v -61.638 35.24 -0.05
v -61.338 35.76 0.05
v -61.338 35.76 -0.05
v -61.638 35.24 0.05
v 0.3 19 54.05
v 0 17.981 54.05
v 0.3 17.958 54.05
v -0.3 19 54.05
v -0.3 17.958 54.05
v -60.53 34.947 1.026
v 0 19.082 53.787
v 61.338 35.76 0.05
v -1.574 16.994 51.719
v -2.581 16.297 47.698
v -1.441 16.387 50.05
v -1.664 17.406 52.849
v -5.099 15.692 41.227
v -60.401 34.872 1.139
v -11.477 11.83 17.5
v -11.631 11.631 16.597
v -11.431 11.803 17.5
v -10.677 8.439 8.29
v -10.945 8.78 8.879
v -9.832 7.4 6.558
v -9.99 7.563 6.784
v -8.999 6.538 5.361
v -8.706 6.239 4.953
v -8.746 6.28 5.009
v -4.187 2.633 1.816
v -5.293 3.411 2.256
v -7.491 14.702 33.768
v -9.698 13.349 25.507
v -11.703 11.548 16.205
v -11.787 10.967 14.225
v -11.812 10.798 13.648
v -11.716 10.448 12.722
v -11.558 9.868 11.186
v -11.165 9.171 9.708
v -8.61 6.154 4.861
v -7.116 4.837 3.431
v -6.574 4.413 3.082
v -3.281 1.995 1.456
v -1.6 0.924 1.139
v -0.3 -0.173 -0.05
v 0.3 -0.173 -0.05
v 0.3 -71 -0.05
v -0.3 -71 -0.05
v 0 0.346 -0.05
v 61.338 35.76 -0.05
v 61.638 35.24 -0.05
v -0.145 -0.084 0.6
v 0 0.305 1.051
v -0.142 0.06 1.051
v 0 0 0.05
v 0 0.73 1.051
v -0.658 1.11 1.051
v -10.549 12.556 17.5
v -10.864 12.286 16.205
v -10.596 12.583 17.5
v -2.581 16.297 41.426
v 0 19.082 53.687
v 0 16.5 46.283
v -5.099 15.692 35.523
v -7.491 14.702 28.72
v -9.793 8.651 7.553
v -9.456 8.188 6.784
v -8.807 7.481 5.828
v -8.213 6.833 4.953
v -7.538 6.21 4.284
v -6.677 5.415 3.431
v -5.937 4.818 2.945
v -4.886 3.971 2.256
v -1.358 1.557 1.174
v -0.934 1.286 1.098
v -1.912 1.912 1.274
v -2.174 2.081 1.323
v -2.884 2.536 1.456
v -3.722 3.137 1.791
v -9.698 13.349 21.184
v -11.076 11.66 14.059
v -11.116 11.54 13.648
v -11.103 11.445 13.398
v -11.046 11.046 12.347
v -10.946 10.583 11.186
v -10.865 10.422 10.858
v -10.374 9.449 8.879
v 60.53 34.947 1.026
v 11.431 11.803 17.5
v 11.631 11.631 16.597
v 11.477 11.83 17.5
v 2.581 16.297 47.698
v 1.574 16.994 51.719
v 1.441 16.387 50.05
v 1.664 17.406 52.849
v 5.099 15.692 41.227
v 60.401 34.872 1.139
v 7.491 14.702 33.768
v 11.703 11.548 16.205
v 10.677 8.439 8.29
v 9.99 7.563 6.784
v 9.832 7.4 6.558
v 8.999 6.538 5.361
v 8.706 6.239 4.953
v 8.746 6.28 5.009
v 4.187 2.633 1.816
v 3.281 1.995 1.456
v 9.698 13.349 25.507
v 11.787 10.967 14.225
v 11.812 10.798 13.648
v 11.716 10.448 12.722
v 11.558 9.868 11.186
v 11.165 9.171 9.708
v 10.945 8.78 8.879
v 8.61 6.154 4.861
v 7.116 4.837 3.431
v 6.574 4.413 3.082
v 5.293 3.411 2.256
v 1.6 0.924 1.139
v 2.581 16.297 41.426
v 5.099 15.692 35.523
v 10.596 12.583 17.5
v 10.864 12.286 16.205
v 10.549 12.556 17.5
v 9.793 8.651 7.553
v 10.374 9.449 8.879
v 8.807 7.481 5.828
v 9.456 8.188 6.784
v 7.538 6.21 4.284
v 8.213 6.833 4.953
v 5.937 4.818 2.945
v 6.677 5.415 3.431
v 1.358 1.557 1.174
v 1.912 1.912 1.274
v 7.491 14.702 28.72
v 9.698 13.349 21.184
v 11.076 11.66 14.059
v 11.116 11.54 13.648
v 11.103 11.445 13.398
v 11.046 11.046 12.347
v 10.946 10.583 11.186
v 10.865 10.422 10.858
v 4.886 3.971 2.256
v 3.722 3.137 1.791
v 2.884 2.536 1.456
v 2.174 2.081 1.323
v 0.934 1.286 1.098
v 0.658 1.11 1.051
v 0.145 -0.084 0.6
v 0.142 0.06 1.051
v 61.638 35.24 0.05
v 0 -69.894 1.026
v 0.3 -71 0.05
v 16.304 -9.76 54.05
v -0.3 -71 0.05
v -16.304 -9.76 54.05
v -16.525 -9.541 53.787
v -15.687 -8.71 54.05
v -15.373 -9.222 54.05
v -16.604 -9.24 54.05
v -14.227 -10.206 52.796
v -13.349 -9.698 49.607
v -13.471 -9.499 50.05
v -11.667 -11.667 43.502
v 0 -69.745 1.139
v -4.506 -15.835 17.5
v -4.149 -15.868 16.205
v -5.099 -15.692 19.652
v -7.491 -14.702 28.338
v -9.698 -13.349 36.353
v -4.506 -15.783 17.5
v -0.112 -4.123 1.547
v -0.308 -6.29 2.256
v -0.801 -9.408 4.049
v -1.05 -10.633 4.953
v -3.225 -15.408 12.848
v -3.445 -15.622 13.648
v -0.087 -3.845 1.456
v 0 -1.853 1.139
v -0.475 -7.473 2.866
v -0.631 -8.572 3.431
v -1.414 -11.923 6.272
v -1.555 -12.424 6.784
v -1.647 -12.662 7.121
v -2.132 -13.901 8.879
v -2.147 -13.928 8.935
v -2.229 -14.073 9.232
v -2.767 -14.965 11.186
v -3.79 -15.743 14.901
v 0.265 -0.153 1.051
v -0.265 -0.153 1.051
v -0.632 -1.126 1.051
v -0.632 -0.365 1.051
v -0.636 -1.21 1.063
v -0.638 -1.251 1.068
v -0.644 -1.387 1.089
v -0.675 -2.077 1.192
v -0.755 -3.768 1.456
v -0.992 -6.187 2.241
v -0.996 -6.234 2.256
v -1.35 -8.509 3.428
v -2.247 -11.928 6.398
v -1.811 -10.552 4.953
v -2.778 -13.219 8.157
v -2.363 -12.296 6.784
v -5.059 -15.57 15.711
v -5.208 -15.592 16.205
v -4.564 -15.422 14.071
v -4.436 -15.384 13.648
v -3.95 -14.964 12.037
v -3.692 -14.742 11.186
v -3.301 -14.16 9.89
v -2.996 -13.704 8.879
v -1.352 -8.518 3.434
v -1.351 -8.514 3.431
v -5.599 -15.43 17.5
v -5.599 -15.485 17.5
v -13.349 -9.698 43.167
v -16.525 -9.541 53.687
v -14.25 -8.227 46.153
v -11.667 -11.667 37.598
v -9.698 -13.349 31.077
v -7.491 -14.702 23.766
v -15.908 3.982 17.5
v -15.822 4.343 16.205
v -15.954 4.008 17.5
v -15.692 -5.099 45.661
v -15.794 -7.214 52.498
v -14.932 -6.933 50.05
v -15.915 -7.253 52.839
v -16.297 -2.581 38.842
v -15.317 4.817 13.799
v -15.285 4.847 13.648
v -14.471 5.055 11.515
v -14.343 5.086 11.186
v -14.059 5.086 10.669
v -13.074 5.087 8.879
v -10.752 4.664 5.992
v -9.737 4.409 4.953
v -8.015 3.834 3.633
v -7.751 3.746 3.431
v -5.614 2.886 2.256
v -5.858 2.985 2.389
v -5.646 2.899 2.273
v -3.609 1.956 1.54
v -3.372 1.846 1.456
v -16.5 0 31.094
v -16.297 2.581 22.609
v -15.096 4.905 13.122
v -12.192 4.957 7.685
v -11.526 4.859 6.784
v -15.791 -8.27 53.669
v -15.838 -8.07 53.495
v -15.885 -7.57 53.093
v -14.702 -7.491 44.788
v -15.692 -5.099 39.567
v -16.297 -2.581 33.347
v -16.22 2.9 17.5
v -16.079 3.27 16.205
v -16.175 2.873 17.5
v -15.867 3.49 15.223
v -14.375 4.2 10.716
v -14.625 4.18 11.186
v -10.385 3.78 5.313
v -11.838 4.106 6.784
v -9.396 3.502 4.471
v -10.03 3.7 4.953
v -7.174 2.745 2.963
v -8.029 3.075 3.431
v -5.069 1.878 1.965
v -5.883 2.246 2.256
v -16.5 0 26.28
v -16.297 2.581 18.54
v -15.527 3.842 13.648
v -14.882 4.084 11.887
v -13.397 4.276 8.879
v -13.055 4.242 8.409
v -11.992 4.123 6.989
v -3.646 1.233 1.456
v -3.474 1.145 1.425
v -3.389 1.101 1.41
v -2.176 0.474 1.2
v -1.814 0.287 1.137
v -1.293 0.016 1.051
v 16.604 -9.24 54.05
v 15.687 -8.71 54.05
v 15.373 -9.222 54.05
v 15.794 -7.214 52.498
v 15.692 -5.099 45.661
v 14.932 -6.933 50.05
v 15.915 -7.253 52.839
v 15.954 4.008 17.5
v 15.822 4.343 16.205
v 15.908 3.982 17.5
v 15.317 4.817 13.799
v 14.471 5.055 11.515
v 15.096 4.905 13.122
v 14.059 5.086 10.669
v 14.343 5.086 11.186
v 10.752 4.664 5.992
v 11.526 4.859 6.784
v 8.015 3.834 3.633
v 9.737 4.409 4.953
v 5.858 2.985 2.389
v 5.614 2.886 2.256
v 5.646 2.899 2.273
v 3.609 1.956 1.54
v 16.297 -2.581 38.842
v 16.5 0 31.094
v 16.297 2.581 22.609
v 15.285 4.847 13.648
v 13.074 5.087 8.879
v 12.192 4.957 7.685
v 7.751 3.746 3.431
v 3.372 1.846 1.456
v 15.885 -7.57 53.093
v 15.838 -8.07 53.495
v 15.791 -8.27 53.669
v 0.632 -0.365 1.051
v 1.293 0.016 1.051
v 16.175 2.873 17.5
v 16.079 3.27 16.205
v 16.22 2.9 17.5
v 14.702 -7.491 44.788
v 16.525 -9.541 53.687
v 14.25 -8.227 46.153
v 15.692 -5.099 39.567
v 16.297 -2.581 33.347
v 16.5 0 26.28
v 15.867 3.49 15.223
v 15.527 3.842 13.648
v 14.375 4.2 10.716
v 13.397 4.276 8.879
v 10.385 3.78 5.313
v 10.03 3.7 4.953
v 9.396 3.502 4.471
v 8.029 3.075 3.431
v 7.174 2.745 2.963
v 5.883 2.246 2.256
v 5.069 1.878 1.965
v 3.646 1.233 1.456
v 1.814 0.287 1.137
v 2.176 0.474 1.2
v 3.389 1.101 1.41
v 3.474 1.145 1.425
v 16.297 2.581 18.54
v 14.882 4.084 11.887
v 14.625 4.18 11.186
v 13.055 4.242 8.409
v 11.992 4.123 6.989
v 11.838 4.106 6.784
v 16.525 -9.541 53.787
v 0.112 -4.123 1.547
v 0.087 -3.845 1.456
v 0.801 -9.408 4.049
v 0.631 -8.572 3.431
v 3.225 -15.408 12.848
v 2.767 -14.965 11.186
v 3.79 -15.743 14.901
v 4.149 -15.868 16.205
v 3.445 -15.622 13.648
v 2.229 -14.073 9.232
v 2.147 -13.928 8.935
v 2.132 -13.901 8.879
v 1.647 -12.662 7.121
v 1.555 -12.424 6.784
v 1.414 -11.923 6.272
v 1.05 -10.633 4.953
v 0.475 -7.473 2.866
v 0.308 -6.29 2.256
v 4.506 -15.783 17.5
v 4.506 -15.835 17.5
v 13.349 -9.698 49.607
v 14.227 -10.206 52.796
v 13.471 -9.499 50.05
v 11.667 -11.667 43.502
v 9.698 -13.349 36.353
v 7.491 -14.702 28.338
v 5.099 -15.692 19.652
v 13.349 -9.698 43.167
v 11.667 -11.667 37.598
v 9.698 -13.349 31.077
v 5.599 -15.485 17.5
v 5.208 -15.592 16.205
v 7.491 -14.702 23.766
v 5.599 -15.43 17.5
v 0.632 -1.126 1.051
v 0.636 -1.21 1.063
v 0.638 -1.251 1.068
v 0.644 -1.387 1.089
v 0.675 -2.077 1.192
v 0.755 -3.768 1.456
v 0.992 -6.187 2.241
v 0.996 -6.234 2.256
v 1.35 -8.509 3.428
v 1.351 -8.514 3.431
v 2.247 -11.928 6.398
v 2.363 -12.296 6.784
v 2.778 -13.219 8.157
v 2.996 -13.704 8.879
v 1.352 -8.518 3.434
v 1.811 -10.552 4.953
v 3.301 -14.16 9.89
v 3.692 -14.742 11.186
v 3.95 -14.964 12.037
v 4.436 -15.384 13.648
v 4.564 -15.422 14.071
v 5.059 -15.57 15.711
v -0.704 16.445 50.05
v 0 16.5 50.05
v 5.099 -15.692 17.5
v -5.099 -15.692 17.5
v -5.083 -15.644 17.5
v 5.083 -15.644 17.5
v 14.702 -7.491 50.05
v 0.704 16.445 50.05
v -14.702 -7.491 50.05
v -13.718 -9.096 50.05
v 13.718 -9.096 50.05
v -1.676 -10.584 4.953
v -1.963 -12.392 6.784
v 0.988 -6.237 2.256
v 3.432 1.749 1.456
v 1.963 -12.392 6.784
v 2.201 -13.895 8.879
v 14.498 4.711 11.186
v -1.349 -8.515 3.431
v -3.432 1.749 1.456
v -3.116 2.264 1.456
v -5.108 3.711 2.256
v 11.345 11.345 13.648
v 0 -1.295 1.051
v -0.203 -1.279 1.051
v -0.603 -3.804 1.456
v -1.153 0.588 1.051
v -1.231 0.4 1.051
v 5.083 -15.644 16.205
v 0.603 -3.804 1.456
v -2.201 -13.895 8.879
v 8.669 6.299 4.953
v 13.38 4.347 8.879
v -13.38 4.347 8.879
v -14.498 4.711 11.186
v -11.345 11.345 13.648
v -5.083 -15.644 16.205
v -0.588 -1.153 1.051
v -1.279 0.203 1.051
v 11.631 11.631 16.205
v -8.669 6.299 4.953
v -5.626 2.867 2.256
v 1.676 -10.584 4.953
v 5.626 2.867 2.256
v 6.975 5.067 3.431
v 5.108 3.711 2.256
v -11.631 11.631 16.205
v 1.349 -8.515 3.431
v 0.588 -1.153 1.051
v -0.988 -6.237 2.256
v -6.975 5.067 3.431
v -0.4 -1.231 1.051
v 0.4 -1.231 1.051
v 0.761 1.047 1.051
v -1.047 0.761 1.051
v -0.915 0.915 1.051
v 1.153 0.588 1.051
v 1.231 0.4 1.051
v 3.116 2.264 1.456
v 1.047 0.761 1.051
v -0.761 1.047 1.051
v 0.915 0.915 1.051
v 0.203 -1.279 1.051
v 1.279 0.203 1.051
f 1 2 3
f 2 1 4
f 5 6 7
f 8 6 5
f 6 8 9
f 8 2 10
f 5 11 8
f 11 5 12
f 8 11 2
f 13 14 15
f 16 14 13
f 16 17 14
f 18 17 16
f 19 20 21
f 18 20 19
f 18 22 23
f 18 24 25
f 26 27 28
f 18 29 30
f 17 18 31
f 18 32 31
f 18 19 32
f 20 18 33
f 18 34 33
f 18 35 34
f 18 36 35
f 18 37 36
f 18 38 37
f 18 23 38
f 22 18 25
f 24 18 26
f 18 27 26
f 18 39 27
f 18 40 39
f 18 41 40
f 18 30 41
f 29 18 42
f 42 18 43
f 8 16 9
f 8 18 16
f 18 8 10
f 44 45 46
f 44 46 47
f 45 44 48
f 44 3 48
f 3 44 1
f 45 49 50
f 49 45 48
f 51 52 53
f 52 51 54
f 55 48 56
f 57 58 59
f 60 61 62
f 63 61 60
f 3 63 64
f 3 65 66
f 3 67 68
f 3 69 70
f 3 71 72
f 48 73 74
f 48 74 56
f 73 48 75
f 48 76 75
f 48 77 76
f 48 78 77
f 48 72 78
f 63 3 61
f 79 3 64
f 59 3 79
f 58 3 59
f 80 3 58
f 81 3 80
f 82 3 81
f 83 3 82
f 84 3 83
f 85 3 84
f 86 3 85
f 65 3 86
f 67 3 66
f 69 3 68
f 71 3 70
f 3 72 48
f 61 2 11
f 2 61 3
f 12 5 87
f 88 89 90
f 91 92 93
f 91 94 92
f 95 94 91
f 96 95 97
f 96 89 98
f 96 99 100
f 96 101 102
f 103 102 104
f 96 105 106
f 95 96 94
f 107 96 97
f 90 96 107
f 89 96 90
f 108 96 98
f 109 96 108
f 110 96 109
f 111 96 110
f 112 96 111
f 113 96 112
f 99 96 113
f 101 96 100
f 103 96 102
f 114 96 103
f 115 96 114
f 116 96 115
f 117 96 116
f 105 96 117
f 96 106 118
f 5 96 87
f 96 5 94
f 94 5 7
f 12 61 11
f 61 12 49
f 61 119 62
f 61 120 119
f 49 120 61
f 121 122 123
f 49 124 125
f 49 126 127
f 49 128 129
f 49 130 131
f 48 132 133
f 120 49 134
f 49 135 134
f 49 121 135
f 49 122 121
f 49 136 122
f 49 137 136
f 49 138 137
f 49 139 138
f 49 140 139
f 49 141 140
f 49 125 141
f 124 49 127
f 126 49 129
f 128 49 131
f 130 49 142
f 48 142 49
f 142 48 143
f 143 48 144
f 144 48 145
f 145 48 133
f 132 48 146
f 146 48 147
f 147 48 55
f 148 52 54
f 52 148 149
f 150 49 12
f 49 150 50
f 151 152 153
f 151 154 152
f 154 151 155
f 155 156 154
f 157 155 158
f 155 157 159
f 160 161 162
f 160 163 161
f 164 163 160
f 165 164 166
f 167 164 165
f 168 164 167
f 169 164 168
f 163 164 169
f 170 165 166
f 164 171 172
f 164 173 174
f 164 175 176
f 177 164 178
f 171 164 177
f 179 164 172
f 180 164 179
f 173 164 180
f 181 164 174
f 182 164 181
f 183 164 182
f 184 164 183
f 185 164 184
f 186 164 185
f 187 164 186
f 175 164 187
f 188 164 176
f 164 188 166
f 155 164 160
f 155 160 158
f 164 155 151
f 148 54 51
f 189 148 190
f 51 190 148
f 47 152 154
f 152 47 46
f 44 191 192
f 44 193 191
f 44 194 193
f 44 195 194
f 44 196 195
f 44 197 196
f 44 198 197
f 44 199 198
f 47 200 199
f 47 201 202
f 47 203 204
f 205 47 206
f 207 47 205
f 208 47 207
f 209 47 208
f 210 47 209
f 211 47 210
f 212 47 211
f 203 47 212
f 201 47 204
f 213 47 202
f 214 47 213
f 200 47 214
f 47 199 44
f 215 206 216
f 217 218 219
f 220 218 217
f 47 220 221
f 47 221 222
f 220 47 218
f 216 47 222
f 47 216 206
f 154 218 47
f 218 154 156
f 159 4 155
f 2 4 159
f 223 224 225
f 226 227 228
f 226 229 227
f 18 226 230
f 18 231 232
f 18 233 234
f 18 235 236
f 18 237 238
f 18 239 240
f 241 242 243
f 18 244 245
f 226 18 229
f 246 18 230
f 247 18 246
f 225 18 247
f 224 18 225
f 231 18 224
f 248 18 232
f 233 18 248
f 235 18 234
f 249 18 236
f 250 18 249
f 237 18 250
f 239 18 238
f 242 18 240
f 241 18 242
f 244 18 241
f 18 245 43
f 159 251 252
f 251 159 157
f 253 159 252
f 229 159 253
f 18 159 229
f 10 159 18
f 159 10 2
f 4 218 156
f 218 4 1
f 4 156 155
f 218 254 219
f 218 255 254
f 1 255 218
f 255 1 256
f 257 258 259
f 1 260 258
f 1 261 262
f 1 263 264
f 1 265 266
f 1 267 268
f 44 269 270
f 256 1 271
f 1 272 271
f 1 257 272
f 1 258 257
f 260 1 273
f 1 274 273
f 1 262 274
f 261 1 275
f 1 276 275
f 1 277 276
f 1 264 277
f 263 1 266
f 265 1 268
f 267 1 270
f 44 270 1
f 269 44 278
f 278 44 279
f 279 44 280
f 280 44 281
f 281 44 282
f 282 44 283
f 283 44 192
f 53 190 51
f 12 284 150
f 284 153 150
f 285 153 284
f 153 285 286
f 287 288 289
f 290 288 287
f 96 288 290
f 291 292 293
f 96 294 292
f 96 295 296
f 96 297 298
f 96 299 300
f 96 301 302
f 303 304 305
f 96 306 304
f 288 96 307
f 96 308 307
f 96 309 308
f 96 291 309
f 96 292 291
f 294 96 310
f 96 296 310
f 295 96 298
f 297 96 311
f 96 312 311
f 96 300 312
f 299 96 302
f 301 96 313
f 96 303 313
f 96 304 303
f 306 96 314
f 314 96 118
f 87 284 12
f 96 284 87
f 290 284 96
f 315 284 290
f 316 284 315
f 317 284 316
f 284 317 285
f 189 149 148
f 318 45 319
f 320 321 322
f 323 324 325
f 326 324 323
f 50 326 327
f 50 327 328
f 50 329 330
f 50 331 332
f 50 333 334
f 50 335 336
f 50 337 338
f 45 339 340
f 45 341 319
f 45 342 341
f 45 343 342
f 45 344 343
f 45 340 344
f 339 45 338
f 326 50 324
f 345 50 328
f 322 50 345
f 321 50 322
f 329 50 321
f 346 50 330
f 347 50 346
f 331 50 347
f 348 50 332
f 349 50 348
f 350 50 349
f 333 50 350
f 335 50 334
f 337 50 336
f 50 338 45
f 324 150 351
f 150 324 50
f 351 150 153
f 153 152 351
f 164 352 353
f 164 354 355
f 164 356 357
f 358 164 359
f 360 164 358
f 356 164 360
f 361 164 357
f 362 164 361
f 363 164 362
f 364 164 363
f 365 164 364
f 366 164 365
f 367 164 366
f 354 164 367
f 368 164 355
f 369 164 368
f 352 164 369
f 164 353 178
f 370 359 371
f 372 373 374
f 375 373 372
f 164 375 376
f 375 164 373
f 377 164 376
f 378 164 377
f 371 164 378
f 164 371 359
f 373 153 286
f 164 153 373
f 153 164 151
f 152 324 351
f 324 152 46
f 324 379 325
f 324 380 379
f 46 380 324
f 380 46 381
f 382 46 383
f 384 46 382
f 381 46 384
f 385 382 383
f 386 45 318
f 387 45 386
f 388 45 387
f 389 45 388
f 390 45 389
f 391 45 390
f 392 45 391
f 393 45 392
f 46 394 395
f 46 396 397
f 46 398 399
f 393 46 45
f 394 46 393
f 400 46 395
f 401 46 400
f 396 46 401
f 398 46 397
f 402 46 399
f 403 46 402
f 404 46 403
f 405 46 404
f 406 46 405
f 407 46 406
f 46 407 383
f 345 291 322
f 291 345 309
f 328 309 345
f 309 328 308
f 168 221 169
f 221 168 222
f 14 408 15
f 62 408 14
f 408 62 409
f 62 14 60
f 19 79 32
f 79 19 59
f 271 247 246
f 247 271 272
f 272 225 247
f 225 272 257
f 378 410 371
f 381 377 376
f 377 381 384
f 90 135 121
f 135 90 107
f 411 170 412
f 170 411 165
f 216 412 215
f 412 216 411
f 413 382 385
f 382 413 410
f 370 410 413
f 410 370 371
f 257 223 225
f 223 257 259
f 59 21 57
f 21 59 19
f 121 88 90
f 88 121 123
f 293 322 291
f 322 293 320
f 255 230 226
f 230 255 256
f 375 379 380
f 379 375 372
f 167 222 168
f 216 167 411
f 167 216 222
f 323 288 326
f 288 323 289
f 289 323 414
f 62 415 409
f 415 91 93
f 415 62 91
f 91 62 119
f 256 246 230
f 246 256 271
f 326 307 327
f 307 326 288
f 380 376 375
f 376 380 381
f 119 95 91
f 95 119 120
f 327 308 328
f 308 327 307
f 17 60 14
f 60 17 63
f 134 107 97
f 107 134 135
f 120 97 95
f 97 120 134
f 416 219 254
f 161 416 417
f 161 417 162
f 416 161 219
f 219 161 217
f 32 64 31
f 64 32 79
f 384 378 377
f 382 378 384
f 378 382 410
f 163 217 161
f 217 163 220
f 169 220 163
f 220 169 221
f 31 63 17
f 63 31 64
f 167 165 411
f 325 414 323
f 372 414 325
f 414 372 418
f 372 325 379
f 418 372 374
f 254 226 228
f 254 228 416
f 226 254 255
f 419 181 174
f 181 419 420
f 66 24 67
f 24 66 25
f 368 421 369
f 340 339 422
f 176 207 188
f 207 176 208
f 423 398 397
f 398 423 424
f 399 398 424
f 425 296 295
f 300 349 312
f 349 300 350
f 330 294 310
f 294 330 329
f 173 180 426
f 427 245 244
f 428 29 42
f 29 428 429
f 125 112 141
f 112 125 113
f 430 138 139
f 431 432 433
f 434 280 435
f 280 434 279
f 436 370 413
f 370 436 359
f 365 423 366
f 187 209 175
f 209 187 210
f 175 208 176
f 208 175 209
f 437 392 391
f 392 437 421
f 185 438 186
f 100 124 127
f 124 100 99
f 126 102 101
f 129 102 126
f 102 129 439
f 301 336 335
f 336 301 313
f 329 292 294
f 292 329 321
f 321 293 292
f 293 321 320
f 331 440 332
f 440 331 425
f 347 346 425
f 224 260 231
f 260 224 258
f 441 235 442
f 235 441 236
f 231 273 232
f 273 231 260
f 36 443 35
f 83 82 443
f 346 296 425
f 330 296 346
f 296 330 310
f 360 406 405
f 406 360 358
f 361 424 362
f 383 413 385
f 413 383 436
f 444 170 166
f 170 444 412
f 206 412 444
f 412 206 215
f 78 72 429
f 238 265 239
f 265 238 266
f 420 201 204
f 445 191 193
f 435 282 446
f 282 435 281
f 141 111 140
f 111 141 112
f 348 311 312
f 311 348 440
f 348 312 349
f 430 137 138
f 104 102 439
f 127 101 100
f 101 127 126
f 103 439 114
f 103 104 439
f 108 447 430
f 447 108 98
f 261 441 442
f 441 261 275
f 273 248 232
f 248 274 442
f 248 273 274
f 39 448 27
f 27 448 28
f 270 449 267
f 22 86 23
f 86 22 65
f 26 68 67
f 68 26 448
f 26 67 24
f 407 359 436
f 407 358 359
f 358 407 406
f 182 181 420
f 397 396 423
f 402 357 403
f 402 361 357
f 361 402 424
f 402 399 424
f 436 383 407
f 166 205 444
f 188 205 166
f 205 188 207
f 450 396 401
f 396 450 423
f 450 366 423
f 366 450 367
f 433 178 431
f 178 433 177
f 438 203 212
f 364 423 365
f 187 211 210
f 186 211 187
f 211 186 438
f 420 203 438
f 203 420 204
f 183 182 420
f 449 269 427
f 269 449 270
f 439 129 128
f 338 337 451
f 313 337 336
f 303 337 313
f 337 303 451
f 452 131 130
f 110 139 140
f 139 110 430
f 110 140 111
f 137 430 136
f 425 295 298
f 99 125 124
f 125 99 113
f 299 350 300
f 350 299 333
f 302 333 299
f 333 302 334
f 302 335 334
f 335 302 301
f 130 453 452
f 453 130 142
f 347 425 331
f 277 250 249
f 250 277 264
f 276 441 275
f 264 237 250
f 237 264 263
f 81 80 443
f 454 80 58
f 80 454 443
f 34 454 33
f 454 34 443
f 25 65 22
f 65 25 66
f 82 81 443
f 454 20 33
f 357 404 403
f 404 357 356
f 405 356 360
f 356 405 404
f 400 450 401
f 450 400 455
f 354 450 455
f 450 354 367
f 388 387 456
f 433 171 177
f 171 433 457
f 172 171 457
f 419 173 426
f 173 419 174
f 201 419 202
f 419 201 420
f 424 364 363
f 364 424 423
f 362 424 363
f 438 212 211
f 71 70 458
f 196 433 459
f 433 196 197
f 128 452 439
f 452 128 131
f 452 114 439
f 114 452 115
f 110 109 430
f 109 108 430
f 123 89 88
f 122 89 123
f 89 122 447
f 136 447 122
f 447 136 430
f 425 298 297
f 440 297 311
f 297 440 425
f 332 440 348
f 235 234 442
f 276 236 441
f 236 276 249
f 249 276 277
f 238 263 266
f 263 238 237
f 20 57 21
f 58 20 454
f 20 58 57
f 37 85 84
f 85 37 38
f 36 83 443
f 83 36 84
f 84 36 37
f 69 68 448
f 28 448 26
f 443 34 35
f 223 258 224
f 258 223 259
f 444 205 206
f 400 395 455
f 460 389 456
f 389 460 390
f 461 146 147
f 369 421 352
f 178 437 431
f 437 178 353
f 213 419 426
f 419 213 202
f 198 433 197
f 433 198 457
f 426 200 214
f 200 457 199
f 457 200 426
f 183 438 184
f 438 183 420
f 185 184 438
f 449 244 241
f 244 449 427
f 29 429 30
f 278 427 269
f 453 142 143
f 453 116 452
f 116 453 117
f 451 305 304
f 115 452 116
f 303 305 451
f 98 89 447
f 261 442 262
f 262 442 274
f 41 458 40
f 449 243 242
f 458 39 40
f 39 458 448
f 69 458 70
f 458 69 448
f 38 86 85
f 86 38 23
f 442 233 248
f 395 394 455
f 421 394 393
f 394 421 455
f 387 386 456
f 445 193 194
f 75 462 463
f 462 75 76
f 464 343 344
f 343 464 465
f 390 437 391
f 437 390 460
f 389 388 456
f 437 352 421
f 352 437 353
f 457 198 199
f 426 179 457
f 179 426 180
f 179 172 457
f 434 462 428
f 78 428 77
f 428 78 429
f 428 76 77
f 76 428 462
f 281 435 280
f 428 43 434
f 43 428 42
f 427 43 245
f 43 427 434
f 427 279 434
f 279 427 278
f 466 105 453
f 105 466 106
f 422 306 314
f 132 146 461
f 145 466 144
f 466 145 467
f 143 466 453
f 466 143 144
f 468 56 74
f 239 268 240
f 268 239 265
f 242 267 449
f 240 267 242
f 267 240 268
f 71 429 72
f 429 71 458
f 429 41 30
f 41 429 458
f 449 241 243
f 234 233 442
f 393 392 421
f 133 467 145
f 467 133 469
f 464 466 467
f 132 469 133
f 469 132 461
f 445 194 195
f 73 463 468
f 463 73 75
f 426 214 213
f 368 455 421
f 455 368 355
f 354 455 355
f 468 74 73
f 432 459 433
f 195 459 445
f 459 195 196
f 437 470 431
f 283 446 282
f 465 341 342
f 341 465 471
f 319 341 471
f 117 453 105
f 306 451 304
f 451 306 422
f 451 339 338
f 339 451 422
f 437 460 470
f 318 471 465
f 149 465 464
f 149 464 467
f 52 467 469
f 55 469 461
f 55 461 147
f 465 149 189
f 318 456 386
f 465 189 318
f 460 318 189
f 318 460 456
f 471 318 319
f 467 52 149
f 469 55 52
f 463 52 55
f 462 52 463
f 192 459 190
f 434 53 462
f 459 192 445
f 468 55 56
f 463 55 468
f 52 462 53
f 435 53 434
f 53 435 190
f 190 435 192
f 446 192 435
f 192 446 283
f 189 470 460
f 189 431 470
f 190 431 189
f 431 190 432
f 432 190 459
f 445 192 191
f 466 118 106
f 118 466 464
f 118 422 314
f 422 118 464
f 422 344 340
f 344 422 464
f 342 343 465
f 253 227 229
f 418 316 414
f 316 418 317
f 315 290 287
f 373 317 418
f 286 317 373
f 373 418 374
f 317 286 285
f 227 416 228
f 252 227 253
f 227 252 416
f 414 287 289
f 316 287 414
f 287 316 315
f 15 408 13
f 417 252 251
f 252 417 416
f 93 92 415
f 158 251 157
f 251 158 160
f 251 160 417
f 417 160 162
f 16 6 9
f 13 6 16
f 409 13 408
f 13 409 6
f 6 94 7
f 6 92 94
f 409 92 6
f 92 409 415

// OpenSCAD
$fn = 40;

nozzle_dia=0.6;

testtube_diameter=32;
testtube_height=180;
testtube_tolerance=1;

module testTubeBulk(diameter=32, height=30+50*3)
{
    translate([0,0,diameter/2])
    {
        cylinder(r=diameter/2, h=height);
        sphere(r=diameter/2);
    }
}

/////////////////////////////////////////////////
// Star Approach
difference()
{
    holderHeight=testtube_height*0.30;
    holderThickness=nozzle_dia;
    holderTopThickness=2;
    holderBaseThickness=holderHeight*1.0;

    union()
    {
//        stepDeg=45;
        stepDeg=360/3;
        for (i = [0:stepDeg:360])
        {
            tubeholedia=testtube_diameter+testtube_tolerance*2;
            tubeBaseShift=20;
            hull()
            {
                rotate([0,0,i])
                    translate([0,tubeholedia/2+holderTopThickness/2,holderHeight])
                        cube([holderThickness,holderTopThickness,0.1], center=true);
                rotate([0,0,i+stepDeg/2])
                    translate([0,(tubeholedia/2+holderBaseThickness)/2,0])
                        cube([holderThickness,tubeholedia/2+holderBaseThickness,0.1], center=true);
            }
            hull()
            {
                rotate([0,0,i])
                    translate([0,tubeholedia/2+holderTopThickness/2,holderHeight])
                        cube([holderThickness,holderTopThickness,0.1], center=true);
                rotate([0,0,i-stepDeg/2])
                    translate([0,(tubeholedia/2+holderBaseThickness)/2,0])
                        cube([holderThickness,tubeholedia/2+holderBaseThickness,0.1], center=true);
            }
        }
    }

    translate([0,0,holderHeight*0.9+0.1])
        cylinder(r1=testtube_diameter/2, r2=testtube_diameter/2+holderTopThickness, h=holderHeight*0.1);

    translate([0,0,1])
        testTubeBulk(testtube_diameter+testtube_tolerance, testtube_height);
}

// Simulated Tube
if (1)
%difference()
{
    translate([0,0,1])
        testTubeBulk(testtube_diameter, testtube_height);
    translate([0,0,1+1])
        testTubeBulk(testtube_diameter-1, testtube_height);
}
